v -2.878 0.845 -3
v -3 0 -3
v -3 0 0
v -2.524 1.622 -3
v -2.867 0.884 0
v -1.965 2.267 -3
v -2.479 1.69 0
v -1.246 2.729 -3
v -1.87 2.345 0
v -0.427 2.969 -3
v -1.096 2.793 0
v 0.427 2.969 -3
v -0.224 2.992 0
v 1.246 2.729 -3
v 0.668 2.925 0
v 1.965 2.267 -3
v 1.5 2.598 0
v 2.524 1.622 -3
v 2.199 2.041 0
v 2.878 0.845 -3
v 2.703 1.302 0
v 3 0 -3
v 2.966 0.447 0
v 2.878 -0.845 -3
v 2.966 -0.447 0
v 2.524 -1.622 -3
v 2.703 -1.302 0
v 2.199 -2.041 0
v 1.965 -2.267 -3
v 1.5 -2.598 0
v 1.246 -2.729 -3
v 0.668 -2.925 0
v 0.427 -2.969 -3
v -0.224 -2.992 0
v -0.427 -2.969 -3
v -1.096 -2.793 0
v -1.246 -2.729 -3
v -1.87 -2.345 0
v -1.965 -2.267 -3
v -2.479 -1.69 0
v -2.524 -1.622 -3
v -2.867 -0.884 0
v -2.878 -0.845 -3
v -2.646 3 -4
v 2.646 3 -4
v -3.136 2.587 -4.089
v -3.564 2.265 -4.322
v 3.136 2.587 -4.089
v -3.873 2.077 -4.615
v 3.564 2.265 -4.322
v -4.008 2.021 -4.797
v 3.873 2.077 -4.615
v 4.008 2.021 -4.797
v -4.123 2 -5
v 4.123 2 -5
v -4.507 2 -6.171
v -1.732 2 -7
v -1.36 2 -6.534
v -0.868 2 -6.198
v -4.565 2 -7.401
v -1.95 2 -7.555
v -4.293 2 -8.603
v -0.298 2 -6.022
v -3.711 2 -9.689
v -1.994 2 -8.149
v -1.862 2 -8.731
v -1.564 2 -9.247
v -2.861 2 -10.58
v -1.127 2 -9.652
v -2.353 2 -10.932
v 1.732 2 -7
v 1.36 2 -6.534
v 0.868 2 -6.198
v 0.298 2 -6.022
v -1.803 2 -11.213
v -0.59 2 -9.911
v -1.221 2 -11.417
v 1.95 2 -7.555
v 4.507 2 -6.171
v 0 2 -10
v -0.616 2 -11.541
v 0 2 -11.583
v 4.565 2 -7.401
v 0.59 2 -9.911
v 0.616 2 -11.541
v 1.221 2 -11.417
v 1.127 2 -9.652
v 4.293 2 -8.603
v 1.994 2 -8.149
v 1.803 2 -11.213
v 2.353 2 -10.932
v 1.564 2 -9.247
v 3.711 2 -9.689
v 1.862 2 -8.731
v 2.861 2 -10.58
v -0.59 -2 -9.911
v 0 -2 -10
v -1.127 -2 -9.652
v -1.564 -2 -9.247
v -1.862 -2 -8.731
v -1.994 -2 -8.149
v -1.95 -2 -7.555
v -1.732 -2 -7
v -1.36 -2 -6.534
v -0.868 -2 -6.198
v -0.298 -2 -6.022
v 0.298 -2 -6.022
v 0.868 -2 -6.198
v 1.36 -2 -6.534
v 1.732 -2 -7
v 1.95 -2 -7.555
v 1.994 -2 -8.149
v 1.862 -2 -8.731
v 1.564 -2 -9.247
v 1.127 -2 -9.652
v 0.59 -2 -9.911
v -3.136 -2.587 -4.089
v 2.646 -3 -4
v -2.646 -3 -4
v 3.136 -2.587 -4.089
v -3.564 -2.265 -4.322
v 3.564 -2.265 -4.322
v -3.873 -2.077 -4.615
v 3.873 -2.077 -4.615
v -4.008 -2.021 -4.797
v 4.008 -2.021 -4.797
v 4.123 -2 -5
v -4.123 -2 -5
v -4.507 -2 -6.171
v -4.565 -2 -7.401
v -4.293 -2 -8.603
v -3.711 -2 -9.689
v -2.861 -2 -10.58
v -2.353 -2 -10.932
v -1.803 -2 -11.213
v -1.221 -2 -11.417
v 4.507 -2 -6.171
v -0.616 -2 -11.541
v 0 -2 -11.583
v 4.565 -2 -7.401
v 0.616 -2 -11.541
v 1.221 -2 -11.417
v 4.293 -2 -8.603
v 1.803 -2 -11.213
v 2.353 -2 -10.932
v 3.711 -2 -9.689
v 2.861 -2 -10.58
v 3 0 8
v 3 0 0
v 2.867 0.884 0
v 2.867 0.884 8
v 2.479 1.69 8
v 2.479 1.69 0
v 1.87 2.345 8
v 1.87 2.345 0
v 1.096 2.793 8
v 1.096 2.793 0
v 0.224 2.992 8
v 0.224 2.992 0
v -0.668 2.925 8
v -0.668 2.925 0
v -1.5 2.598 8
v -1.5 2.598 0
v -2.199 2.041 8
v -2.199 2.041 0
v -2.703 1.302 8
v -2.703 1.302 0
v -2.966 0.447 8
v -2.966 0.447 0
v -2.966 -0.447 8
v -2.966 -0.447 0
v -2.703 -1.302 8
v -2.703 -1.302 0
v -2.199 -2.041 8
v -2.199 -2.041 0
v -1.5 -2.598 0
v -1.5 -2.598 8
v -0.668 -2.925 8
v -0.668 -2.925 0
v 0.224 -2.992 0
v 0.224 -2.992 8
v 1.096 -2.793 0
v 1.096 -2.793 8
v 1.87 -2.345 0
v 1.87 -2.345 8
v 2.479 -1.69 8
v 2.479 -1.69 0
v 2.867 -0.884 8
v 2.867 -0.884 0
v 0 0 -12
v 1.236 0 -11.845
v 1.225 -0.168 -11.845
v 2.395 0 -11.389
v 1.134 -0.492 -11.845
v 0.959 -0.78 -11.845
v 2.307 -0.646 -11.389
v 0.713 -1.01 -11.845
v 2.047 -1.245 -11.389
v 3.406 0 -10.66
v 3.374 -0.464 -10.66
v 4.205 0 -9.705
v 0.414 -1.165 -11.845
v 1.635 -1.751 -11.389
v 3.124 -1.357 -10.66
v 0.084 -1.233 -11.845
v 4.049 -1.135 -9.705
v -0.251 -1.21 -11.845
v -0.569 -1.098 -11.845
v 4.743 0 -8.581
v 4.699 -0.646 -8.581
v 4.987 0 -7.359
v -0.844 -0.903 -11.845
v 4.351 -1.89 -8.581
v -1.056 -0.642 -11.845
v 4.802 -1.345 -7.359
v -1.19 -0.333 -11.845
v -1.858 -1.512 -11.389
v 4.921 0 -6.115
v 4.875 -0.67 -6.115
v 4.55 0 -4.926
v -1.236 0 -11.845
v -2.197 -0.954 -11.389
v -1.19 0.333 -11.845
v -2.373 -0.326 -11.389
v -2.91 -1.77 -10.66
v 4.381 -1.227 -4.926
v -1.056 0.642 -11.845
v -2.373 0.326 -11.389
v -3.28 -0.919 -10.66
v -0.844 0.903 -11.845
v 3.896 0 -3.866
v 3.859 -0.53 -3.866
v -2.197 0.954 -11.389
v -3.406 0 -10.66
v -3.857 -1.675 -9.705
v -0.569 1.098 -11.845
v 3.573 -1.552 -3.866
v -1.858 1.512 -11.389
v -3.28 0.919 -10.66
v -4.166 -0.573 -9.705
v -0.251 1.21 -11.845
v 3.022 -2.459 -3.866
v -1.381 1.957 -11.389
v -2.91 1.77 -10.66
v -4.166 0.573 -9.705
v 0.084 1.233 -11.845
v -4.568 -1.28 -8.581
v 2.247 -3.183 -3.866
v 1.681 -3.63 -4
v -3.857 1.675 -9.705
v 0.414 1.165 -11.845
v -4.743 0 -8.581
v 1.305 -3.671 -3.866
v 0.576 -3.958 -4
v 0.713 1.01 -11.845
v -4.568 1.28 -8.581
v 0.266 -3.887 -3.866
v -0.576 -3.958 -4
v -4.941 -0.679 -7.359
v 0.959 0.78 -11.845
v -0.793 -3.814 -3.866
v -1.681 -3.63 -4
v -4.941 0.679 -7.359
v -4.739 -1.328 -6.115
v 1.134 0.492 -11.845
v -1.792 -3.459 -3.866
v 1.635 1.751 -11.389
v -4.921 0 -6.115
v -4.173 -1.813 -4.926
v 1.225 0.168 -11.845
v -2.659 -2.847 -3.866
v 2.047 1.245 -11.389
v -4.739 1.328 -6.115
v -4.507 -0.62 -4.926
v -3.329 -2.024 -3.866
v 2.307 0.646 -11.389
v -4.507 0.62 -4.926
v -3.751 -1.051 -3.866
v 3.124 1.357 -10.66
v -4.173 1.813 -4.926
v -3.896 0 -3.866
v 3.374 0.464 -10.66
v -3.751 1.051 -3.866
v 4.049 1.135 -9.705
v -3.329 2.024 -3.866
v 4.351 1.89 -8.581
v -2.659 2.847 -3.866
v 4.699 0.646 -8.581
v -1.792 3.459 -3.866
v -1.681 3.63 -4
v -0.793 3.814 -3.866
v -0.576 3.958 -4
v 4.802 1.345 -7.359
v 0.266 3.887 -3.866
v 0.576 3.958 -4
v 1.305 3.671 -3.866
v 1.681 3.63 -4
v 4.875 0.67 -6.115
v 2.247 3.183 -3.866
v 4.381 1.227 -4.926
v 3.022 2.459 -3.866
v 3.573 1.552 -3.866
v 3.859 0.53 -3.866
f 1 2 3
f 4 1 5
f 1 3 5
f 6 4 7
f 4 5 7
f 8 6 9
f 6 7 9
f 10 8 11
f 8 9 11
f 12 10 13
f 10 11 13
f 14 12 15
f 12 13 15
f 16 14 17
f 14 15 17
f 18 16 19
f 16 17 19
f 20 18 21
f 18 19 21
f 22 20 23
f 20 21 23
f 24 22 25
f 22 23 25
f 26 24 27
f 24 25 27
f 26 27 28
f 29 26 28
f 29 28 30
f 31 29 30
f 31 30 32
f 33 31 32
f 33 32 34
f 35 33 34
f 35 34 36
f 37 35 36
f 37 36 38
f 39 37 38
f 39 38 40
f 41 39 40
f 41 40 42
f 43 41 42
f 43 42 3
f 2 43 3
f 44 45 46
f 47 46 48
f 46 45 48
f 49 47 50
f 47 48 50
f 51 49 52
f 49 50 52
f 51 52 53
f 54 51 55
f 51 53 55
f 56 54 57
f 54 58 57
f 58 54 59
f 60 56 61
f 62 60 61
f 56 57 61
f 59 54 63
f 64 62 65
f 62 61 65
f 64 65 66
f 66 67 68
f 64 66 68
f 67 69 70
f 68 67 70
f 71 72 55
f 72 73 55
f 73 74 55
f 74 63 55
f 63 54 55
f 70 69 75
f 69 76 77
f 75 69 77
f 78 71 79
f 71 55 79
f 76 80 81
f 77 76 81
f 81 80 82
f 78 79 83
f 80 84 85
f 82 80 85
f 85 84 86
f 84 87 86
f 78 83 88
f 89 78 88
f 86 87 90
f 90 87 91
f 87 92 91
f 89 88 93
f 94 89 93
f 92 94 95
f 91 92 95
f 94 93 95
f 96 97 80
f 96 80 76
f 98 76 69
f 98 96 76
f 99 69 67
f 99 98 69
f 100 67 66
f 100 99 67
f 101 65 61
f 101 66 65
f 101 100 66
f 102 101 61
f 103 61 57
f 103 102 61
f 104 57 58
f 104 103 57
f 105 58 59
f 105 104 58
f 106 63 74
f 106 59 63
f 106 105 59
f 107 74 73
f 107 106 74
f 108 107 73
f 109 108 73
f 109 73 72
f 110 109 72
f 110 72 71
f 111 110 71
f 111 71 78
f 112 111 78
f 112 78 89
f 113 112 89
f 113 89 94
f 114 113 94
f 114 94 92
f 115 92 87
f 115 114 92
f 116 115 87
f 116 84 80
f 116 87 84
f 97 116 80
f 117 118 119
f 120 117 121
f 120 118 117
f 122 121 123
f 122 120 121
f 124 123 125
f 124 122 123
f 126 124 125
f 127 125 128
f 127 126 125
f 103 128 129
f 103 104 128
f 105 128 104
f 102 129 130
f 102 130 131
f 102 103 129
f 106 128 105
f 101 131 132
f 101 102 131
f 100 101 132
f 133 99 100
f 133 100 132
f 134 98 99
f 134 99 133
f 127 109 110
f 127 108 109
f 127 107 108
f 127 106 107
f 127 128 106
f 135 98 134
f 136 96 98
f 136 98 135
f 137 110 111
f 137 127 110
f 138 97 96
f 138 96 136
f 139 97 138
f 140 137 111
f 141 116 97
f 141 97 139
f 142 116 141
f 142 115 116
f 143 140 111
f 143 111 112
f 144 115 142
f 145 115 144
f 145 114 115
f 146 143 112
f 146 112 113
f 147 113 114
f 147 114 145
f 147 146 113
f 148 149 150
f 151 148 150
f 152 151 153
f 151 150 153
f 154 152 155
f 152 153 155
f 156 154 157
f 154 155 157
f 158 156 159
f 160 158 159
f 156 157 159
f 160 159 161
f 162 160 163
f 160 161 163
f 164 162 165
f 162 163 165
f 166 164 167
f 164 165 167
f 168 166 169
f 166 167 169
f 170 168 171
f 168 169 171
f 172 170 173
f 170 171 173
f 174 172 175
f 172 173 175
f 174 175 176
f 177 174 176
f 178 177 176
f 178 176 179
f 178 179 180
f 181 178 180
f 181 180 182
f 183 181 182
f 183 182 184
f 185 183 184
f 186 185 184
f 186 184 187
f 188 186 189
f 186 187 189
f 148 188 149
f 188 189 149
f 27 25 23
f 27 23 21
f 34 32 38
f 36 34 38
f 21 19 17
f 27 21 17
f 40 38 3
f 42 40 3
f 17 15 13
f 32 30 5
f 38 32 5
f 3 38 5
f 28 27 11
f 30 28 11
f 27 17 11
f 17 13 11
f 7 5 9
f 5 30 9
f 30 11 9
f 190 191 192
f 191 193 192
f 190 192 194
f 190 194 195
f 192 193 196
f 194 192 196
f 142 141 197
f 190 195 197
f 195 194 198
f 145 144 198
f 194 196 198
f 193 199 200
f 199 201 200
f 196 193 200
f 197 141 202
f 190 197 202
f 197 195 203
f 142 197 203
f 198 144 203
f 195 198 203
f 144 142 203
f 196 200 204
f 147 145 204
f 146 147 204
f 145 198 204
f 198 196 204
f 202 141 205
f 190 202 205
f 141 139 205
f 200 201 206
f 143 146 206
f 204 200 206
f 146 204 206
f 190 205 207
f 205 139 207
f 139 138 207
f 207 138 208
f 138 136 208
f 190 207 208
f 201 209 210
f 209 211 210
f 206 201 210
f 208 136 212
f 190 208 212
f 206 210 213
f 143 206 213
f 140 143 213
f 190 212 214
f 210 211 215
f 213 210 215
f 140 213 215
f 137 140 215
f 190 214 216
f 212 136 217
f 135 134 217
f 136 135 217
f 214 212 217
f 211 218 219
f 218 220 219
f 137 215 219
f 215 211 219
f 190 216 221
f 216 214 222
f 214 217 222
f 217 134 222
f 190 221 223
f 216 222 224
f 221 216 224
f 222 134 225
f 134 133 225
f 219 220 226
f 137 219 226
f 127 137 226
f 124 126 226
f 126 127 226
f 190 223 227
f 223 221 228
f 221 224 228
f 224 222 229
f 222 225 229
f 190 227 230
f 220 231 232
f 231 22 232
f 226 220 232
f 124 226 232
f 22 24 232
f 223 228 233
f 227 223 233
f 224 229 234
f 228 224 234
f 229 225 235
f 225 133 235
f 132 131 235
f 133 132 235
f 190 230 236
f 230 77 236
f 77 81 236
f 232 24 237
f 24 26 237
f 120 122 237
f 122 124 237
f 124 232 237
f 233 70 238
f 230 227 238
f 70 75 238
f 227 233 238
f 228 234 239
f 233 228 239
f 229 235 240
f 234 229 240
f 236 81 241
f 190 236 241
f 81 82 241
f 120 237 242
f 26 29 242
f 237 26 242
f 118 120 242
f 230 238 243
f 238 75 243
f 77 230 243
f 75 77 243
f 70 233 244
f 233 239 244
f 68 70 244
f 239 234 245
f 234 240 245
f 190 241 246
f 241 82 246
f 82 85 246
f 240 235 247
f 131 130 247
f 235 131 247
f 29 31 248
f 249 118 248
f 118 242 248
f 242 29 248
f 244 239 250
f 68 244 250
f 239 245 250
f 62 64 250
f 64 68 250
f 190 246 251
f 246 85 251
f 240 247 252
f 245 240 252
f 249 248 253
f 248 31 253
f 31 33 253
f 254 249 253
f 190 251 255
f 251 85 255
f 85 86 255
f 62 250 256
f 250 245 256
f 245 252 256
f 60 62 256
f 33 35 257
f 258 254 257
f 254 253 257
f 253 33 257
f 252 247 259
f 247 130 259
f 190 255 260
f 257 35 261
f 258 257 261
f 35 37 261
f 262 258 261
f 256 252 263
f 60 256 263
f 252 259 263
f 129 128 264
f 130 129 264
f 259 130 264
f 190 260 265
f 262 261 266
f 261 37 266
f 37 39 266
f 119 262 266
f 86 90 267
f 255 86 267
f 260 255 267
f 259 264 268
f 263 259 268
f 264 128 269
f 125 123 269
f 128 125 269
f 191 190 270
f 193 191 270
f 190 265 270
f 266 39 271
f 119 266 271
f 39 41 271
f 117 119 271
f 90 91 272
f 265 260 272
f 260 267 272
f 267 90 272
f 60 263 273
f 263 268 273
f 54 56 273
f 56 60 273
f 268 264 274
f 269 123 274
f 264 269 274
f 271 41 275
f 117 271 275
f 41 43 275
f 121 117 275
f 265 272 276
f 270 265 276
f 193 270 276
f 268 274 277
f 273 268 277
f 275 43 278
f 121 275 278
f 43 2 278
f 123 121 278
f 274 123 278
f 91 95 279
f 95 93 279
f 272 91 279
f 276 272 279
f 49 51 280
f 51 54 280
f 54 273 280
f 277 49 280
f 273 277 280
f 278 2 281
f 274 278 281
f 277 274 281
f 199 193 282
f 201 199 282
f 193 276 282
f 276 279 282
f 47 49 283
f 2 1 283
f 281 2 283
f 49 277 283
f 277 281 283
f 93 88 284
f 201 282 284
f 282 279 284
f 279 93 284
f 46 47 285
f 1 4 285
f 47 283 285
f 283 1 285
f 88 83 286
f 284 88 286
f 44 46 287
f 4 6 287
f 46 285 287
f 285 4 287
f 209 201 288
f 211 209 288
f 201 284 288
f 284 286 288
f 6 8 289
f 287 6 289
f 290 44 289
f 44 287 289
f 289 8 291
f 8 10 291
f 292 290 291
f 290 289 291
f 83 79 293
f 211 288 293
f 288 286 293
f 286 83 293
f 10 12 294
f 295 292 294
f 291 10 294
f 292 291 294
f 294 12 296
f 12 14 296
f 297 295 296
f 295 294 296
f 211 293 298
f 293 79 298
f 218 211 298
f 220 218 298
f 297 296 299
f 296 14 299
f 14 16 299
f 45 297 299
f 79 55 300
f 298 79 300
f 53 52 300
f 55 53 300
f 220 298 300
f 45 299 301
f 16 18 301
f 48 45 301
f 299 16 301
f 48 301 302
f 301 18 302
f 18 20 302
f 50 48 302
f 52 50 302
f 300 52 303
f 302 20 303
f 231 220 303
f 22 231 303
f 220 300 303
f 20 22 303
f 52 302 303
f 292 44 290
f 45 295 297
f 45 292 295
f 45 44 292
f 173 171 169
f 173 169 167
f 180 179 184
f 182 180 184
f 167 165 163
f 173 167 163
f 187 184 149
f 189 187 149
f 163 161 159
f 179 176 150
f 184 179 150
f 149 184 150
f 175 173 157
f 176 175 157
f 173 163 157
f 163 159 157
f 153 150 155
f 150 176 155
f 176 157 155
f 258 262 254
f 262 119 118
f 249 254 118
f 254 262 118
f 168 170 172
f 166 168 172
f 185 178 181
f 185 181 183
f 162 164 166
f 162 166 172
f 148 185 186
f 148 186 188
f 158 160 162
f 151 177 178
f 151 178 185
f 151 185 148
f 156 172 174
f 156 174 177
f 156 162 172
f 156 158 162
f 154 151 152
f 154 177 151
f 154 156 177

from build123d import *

# Parameters (mm, degrees)
CROQUIS1_R                 = 3
SALIENTE_EXTRUIR3_DEPTH    = 8
CROQUIS4_R                 = 3
SALIENTE_EXTRUIR5_DEPTH    = 3
CROQUIS7_W                 = 8
CROQUIS7_H                 = 3
CORTAR_EXTRUIR3_DEPTH      = 14.928388277
REDONDEO2_R                = 1
REDONDEO2_OF_SIMETR_A2_R   = 1
CORTAR_EXTRUIR4_DEPTH      = 14.601470538
CORTAR_EXTRUIR4_DEPTH_BACK = 14.601470538
CROQUIS8_R                 = 2


with BuildPart() as part:
    # Croquis1 → Saliente-Extruir3 (new body)
    with BuildSketch(Plane.XY):
        Circle(CROQUIS1_R)
    extrude(amount=SALIENTE_EXTRUIR3_DEPTH)


with BuildPart() as body_2:
    # Croquis4 → Saliente-Extruir5 (new body)
    with BuildSketch(Plane(origin=(0, 0, 0), x_dir=(-1, 0, 0), z_dir=(0, 0, -1))):
        Circle(CROQUIS4_R)
    extrude(amount=SALIENTE_EXTRUIR5_DEPTH)

    # Croquis5 → Revolución1 (revolve)
    with BuildSketch(Plane(origin=(0, 0, 0), x_dir=(1, 0, 0), z_dir=(0, 1, 0)), mode=Mode.PRIVATE) as revoluci_n1_sk:
        with BuildLine():
            Line((-3, 3), (0, 3))
            Line((0, 3), (0, 12))
            ThreePointArc((0, 12), (-4.74341649, 8.58113883), (-3, 3))
        make_face()
    revolve(revoluci_n1_sk.sketch.rotate(Axis((0, 0, 0), (0, 0, -1)), 180), axis=Axis((0, 0, 0), (0, 0, -1)))

    # Croquis7 → Cortar-Extruir3 (cut, symmetric)
    with BuildSketch(Plane(origin=(0, 0, 0), x_dir=(0, 0, -1), z_dir=(1, 0, 0))):
        with Locations((8, 3.5)):
            Rectangle(CROQUIS7_W, CROQUIS7_H)
    cortar_extruir3 = extrude(amount=CORTAR_EXTRUIR3_DEPTH, both=True, mode=Mode.SUBTRACT)

    # Redondeo2
    redondeo2_edges = [body_2.edges().sort_by_distance(p)[0] for p in [
        (0, 2, -4),
    ]]
    fillet(redondeo2_edges, radius=REDONDEO2_R)

    # Simetría2: Cortar-Extruir3 across plane
    add(cortar_extruir3.mirror(Plane.ZX), mode=Mode.SUBTRACT)

    # Redondeo2 of Simetría2
    redondeo2_of_simetr_a2_edges = [body_2.edges().sort_by_distance(p)[0] for p in [
        (0, -2, -4),
    ]]
    fillet(redondeo2_of_simetr_a2_edges, radius=REDONDEO2_OF_SIMETR_A2_R)

    # Croquis8 → Cortar-Extruir4 (cut, two sides: drawn at the far end of the back side and taken through both)
    with BuildSketch(Plane(origin=(0, 0, 0), x_dir=(1, 0, 0), z_dir=(0, 1, 0)).offset(-CORTAR_EXTRUIR4_DEPTH_BACK)):
        with Locations(Location((0, 8, 0), (0, 0, 90))):
            Circle(CROQUIS8_R)
    extrude(amount=CORTAR_EXTRUIR4_DEPTH + CORTAR_EXTRUIR4_DEPTH_BACK, mode=Mode.SUBTRACT)


solid = Compound([part.part, body_2.part])
